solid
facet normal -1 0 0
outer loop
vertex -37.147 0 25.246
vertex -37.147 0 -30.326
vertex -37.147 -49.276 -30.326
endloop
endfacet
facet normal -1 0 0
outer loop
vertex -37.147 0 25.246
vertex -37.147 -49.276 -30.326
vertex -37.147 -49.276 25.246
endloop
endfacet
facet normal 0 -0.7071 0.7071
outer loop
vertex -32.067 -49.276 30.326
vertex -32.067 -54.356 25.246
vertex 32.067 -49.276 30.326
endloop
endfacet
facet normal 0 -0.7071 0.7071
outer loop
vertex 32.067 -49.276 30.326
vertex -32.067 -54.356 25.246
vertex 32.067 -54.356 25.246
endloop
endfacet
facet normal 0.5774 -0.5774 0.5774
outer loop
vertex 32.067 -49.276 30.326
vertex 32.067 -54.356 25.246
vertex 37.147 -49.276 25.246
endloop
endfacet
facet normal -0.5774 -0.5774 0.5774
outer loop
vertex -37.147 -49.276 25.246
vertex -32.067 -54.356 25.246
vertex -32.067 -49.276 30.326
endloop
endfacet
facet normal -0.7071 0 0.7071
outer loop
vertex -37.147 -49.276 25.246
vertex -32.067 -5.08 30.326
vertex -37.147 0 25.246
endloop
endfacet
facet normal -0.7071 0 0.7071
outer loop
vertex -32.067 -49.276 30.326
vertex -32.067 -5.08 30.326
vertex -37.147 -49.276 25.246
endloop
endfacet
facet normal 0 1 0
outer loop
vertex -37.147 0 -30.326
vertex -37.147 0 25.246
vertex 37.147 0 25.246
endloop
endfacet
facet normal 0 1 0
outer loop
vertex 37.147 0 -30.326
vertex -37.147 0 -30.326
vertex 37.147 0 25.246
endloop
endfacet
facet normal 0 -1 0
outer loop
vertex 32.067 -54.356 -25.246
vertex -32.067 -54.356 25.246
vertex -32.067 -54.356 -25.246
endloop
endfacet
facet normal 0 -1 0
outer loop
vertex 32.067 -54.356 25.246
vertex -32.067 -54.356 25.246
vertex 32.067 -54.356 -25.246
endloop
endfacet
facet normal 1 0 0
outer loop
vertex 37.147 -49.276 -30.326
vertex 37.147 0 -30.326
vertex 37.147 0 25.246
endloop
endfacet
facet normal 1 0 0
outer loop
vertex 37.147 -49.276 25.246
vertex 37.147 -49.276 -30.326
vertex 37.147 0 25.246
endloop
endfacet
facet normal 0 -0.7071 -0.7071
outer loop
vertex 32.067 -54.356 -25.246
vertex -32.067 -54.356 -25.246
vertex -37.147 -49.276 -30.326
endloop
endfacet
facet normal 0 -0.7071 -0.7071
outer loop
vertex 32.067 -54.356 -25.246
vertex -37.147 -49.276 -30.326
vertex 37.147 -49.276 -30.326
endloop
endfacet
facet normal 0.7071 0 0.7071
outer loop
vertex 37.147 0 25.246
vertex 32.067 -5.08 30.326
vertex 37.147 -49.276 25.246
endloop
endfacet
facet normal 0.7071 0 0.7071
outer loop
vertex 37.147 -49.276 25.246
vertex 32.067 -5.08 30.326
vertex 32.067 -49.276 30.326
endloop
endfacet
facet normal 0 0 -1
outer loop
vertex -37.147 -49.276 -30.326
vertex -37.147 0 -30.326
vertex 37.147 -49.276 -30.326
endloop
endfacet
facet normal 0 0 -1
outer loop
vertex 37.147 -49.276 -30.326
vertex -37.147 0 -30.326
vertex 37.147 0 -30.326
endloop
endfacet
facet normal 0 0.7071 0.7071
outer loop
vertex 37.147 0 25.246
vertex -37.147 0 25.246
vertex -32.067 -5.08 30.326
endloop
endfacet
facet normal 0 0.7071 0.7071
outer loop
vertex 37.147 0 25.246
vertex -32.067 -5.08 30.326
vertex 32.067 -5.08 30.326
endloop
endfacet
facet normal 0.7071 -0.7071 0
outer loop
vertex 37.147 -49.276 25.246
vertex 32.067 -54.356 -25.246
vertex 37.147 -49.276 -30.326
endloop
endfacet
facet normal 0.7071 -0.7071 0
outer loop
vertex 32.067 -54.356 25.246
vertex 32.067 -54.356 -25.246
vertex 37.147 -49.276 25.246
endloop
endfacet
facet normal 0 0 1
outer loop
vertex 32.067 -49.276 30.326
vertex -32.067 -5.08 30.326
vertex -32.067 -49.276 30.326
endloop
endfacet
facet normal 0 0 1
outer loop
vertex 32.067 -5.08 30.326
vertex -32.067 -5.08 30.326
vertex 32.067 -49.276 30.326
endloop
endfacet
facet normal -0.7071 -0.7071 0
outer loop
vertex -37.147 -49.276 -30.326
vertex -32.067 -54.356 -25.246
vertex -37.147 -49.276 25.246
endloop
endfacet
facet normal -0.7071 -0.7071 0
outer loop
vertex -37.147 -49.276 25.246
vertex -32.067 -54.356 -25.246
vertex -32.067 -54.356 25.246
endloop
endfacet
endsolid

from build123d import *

# Parameters (mm, degrees)
F0_W     = 74.2949992418
F0_H     = 60.6527402997
F1_DEPTH = 54.356
F2_SIZE2 = 5.08
F2_SIZE  = 5.08


# Not quite as in the source:
# - the program builds the solid bodies; features that only make, move or delete a surface that nothing else refers to are left out


with BuildPart() as f1:
    # F0 (on Front) → F1 (new body)
    with BuildSketch(Plane.XZ):
        Rectangle(F0_W, F0_H)
    extrude(amount=F1_DEPTH)

    # F2
    f2_edges = [f1.edges().sort_by_distance(p)[0] for p in [
        (37.1475, -54.356, 0),
        (0, -54.356, 30.32637),
        (-37.1475, -54.356, 0),
        (0, -54.356, -30.32637),
        (37.1475, -27.178, 30.32637),
        (-37.1475, -27.178, 30.32637),
        (0, 0, 30.32637),
    ]]
    chamfer(f2_edges, length=F2_SIZE, length2=F2_SIZE2)


solid = f1.part
